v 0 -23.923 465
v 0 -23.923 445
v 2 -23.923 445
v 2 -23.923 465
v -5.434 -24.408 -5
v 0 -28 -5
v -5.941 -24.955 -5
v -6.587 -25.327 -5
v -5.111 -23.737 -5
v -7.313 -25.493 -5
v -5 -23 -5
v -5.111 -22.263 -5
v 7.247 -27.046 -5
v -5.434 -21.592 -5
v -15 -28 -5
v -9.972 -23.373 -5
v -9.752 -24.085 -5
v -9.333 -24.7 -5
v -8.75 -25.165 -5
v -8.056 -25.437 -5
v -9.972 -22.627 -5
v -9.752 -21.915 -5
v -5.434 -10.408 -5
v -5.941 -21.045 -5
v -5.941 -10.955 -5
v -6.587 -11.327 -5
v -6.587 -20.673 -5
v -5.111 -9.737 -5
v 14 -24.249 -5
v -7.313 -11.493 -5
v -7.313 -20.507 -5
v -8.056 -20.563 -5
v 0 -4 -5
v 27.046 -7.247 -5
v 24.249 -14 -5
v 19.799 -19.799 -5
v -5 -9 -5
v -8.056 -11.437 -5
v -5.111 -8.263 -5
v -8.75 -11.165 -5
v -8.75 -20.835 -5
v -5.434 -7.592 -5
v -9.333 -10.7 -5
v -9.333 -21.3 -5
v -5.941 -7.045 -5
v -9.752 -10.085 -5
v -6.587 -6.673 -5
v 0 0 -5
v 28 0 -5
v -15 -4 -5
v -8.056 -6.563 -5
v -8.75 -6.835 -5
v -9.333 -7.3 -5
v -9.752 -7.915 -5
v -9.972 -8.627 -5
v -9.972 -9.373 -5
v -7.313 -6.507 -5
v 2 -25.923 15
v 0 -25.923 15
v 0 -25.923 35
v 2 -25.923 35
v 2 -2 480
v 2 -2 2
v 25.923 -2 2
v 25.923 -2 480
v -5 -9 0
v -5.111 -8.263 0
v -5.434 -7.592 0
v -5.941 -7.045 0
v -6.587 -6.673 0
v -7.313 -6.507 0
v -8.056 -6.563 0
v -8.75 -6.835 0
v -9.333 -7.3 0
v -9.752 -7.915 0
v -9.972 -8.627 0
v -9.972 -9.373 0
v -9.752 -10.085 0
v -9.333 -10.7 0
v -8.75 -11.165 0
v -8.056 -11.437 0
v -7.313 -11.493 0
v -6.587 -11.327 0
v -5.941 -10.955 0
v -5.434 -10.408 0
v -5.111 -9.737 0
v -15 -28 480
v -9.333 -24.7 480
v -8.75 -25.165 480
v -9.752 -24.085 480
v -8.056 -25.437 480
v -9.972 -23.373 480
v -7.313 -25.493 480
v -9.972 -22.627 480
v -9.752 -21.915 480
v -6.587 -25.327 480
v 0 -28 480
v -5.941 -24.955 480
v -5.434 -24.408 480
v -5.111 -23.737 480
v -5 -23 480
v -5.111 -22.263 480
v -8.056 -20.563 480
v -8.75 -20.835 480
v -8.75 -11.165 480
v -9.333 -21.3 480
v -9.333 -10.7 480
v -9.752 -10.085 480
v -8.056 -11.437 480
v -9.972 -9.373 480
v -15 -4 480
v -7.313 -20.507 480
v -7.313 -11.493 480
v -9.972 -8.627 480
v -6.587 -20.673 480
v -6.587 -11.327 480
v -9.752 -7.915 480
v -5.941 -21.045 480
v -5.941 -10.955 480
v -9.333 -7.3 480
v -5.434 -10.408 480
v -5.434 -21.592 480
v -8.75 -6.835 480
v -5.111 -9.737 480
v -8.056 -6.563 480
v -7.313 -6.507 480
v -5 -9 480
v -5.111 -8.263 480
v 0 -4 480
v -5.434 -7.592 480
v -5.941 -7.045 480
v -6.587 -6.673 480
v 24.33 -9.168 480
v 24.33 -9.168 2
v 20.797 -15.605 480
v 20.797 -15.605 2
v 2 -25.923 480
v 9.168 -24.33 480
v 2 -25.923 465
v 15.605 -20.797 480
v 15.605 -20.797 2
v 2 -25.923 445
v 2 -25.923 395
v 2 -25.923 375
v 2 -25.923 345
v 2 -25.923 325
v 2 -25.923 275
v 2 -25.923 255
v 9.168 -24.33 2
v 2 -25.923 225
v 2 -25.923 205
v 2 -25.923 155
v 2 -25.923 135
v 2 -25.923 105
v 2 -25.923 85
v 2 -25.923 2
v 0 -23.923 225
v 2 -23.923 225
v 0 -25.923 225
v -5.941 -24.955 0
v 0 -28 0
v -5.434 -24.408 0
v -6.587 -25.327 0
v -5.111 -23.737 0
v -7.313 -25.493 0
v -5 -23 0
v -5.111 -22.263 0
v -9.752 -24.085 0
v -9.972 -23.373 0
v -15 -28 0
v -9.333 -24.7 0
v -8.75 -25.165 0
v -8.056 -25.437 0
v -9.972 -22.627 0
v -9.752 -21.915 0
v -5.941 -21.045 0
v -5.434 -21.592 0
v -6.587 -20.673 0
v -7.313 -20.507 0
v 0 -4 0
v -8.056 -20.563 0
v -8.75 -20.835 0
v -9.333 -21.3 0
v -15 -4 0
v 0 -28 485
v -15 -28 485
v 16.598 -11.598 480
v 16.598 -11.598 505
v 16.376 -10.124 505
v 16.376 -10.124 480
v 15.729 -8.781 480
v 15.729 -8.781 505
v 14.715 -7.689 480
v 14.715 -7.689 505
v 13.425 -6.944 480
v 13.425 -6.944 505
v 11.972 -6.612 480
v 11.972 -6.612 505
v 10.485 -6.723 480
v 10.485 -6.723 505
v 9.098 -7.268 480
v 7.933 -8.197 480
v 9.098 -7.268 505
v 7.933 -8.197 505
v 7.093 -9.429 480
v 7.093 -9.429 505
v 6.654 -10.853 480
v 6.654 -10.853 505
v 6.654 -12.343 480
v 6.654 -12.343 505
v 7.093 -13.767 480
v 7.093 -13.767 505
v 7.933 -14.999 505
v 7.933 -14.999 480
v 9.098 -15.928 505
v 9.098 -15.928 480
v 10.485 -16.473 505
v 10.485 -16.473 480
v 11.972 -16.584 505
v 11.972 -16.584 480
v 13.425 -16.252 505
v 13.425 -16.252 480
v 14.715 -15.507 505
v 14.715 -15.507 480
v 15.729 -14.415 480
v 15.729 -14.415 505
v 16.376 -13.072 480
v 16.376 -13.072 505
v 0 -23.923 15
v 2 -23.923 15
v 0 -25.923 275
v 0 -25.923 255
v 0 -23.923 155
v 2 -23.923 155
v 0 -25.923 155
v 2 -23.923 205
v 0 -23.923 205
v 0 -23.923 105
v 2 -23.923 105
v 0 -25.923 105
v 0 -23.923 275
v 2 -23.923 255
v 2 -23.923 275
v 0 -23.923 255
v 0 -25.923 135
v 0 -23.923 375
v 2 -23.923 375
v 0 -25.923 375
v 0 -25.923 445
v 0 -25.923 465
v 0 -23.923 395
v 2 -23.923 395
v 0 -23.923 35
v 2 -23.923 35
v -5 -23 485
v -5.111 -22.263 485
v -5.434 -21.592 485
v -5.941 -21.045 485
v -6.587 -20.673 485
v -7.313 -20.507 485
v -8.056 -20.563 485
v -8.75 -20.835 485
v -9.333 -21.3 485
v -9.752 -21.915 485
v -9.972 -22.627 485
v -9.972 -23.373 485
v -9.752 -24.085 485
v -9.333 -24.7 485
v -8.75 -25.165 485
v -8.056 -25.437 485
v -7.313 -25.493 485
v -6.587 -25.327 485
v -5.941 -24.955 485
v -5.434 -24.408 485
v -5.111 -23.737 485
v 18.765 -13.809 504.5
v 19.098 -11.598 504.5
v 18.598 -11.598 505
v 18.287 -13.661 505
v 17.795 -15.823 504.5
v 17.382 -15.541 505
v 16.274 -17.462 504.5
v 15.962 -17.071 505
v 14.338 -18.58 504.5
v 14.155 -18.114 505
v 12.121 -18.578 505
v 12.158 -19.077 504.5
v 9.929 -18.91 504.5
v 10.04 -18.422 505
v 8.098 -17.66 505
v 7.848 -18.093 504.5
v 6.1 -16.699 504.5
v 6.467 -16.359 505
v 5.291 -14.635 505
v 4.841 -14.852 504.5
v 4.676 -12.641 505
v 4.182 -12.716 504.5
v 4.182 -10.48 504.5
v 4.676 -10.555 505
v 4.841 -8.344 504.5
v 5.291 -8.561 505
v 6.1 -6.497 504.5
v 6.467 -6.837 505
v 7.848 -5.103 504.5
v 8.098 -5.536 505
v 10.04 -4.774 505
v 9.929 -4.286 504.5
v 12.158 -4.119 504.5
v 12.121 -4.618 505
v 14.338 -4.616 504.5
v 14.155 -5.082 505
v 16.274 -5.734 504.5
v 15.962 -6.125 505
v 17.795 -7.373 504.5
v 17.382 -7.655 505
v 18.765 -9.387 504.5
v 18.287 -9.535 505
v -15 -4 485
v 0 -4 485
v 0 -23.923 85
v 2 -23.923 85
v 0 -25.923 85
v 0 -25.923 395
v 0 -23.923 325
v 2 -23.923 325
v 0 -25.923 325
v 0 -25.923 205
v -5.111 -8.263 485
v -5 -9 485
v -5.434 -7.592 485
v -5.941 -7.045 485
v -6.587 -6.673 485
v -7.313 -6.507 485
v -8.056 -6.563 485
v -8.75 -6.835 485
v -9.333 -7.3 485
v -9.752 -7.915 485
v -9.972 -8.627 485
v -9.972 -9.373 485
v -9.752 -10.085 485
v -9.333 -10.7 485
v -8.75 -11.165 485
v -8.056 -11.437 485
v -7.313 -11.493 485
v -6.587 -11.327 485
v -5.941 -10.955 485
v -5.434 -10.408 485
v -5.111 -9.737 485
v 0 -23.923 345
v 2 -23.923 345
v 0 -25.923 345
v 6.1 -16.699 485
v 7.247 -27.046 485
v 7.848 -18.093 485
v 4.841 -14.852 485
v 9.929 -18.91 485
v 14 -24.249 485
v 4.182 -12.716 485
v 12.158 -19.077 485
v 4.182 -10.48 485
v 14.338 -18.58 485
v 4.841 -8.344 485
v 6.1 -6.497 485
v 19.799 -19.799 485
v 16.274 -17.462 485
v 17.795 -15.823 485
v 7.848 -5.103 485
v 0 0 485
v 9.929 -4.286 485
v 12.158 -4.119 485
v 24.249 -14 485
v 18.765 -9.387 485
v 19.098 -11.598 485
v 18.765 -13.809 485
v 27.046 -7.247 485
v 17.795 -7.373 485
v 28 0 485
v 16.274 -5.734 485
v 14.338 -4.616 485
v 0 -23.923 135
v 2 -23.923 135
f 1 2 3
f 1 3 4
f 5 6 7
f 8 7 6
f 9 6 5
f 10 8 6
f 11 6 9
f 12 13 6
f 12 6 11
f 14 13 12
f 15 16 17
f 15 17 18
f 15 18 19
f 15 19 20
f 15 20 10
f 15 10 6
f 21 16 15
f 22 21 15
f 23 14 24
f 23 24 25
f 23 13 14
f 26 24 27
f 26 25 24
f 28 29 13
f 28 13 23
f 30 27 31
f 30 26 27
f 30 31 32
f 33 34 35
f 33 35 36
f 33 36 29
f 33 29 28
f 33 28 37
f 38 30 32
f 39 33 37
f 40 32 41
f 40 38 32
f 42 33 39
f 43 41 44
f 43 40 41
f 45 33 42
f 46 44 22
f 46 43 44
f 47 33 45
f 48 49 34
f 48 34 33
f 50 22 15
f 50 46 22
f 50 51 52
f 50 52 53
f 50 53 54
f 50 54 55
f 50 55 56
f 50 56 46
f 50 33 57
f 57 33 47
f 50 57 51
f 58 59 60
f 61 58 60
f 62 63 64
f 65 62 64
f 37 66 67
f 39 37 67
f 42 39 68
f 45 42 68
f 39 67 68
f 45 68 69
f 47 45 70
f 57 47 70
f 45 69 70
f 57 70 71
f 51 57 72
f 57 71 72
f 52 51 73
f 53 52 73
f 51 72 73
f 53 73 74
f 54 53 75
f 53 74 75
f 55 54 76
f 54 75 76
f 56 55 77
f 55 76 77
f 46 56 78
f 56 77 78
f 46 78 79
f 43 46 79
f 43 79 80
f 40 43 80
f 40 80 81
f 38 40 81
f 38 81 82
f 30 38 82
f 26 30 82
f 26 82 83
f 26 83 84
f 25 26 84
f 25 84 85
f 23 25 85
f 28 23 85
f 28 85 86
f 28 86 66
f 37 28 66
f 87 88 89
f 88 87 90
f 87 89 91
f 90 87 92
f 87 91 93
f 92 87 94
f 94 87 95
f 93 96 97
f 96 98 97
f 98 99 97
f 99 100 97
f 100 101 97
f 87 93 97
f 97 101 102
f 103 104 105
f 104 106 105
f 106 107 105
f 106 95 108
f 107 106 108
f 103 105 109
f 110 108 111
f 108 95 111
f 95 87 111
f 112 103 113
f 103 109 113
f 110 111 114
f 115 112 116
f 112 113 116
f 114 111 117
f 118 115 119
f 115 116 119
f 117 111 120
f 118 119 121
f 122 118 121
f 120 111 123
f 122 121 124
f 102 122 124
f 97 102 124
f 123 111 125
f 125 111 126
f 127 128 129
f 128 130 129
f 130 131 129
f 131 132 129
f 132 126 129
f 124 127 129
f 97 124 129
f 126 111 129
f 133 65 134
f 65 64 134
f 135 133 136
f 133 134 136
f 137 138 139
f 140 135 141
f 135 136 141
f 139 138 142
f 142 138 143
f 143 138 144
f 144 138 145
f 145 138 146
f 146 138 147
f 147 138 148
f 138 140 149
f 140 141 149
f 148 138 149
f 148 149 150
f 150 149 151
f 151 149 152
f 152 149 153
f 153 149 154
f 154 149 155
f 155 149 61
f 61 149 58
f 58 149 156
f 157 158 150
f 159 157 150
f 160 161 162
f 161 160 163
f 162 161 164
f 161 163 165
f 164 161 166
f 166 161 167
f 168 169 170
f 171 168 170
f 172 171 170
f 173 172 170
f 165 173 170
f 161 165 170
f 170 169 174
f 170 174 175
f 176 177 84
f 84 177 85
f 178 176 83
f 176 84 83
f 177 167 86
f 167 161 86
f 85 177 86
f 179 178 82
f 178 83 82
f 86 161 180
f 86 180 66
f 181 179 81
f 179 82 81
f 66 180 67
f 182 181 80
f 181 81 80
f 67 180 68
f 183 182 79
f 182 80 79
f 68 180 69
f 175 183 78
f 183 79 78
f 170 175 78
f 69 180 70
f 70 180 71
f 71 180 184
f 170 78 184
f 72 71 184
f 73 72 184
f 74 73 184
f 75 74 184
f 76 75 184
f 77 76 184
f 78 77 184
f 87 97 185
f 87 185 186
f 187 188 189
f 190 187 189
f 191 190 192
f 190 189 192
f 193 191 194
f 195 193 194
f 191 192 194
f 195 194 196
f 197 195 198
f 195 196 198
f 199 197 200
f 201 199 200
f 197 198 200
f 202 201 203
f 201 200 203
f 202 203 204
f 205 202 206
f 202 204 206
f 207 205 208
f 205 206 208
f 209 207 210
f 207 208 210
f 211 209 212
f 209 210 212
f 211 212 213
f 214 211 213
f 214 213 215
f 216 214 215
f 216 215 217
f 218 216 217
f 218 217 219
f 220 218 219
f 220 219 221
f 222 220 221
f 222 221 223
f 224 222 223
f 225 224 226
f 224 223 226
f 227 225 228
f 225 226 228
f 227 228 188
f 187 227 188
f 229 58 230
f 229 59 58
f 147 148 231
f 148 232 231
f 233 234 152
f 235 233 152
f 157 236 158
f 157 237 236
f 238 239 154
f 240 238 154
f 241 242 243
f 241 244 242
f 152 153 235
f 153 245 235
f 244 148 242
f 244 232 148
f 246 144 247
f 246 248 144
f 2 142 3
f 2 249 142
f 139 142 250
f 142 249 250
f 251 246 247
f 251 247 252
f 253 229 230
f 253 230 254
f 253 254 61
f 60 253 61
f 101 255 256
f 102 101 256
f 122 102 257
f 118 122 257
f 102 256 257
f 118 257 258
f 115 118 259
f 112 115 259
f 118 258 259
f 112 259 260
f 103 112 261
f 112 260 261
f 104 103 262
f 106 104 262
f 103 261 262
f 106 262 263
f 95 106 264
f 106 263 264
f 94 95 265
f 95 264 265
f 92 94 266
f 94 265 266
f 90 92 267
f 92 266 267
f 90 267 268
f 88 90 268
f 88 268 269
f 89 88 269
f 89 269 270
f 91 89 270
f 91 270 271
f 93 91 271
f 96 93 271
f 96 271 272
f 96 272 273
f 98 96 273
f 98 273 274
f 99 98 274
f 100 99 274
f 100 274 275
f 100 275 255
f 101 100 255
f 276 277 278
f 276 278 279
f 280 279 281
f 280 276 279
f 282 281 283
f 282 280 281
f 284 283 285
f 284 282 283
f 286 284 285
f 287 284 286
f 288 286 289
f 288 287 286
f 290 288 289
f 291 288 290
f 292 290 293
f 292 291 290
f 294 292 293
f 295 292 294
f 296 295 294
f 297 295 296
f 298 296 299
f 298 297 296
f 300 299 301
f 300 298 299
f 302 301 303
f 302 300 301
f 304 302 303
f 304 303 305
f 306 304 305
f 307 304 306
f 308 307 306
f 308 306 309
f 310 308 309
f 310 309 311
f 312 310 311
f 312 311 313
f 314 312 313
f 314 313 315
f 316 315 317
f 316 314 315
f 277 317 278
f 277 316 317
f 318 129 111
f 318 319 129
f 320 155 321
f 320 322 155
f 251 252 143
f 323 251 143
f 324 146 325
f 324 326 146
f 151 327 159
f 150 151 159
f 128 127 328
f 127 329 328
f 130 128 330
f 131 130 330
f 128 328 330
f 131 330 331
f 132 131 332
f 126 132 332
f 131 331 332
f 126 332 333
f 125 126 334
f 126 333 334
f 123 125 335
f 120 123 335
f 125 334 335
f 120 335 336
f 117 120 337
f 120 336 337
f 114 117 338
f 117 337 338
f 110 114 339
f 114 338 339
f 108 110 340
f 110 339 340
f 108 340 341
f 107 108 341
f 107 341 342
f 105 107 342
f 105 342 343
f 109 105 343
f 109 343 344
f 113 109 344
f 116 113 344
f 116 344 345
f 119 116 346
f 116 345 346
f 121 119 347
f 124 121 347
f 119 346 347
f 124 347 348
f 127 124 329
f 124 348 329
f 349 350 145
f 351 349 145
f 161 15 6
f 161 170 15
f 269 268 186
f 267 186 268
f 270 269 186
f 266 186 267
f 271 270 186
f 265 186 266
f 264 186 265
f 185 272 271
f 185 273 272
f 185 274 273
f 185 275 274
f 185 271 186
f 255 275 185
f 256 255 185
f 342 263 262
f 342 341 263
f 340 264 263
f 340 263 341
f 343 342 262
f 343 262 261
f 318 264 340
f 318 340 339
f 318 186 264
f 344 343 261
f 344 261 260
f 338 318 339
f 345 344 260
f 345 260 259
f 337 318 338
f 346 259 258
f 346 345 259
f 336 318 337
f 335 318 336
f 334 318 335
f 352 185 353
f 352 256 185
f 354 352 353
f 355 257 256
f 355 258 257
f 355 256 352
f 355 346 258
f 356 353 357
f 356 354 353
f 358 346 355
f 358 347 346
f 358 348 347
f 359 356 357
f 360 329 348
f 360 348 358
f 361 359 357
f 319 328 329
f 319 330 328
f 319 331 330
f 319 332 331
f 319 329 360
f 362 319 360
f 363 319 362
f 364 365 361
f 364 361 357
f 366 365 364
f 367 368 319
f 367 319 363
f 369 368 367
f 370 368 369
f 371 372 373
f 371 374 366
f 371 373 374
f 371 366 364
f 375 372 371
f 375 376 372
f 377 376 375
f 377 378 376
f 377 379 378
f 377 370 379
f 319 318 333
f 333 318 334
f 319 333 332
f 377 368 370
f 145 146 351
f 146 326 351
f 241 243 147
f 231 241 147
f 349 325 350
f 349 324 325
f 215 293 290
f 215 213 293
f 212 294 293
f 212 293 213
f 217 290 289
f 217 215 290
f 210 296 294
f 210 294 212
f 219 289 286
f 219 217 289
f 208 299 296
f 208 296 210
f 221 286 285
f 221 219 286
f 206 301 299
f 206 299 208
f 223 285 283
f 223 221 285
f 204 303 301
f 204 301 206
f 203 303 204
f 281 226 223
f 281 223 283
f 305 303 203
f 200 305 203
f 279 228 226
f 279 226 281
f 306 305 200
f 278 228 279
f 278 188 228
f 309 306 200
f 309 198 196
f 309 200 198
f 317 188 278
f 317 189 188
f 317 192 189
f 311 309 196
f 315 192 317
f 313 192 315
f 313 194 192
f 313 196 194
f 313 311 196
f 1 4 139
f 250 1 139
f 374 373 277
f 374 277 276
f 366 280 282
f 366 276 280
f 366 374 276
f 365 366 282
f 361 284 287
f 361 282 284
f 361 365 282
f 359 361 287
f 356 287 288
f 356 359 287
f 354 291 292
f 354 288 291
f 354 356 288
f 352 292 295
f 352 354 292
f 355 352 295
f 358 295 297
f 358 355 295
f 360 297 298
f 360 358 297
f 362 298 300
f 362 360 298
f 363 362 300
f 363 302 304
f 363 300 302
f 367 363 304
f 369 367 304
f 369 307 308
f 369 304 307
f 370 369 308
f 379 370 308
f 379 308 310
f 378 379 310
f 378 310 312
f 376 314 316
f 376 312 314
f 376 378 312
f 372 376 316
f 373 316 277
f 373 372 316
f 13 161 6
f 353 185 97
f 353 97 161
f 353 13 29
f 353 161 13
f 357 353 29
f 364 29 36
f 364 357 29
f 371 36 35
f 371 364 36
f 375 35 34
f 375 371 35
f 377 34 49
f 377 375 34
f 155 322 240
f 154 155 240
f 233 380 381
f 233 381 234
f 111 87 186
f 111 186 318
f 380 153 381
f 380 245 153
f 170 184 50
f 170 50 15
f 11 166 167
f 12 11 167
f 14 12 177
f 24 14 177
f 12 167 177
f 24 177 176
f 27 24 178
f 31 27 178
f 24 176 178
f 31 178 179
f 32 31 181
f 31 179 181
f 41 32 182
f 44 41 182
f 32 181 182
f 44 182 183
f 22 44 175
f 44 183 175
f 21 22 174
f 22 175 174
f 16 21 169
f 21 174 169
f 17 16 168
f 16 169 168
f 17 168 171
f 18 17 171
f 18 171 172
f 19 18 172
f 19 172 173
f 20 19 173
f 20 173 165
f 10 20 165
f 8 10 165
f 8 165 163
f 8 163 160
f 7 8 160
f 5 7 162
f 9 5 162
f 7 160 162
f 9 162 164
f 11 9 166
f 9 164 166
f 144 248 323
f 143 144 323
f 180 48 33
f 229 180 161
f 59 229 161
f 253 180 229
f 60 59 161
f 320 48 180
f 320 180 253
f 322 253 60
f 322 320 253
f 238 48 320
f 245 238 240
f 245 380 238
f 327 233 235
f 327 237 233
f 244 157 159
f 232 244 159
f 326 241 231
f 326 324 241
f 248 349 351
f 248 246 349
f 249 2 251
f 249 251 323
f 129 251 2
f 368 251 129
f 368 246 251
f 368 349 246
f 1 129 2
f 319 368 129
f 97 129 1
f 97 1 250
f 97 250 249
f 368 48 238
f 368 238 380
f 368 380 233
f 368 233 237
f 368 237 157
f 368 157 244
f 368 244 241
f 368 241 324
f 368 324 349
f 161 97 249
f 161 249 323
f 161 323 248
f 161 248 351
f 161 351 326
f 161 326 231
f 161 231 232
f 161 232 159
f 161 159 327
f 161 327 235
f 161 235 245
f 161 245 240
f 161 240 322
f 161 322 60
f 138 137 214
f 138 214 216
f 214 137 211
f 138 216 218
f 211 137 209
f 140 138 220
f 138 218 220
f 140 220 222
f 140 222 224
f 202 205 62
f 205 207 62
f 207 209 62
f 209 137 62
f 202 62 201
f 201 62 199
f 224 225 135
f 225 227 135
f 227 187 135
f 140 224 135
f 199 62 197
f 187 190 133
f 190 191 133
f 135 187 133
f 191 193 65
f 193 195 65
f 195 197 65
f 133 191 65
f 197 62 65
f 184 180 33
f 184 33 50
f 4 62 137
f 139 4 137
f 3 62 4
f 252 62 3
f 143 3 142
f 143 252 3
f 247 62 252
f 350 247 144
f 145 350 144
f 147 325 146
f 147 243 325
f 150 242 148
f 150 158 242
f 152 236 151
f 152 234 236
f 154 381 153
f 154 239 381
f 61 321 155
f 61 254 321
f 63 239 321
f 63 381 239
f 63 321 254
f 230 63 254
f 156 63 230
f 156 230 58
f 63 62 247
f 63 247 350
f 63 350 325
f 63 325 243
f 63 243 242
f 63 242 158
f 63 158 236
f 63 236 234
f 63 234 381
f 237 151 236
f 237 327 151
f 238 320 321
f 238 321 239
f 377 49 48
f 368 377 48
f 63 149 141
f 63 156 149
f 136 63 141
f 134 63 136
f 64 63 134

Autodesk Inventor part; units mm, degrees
ref_plane "YZ Plane" through (0, 0, 0) normal (1, 0, 0) x (0, 1, 0)
ref_plane "XZ Plane" through (0, 0, 0) normal (0, 1, 0) x (-1, 0, 0)
ref_plane "XY Plane" through (0, 0, 0) normal (0, 0, 1) x (1, 0, 0)
sketch "草图1" plane through (0, 0, 0) normal (0, 0, 1) x (1, 0, 0)
  arc A0 (0, -28) -> (28, 0) centre (0, 0) ccw
  line L0 (0, 0) -> (28, 0)
  line L1 (0, 0) -> (0, -28)
  dimension "d0" = 28
extrude "拉伸1" add sketch "草图1" along normal blind 480
shell "抽壳1" thickness 2 removed faces 1 at (13.1163, -13.1163, 480)
sketch "草图2" plane through (0, 0, 480) normal (0, 0, 1) x (1, 0, 0)
  line L0 (0, -28) -> (-15, -28)
  line L1 (-15, -28) -> (-15, 0)
  line L2 (-15, 0) -> (0, 0)
  line L3 (0, 0) -> (0, -28)
  line L4 (28, 0) -> (0, 0) projected
  arc A0 (0, -28) -> (28, 0) centre (0, 0) ccw
  line L5 (0, 0) -> (28, 0)
  line L6 (0, 0) -> (0, -28)
  line L7 (0, 0) -> (0, -28) projected
  dimension "d4" = 15
extrude "拉伸2" add sketch "草图2" along normal blind 5
sketch "草图3" plane through (0, 0, 485) normal (0, 0, 1) x (1, 0, 0)
  circle A0 centre (11.598, -11.598) radius 7.5
  circle A1 centre (11.598, -11.598) radius 11.598
  line L0 (28, 0) -> (-15, 0) projected
  line L1 (0, 0) -> (0, -28) projected
  arc A2 (0, -28) -> (28, 0) centre (0, 0) ccw projected
  dimension "d7" = 15
extrude "拉伸3" add sketch "草图3" along normal blind 20 contours A0
sketch "草图4" plane through (11.598, -11.598, 505) normal (0, 0, 1) x (1, 0, 0)
  circle A0 centre (0, 0) radius 5
  circle A1 centre (0, 0) radius 7.5 projected
  point P0 (-11.598, 11.598)
  dimension "d10" = 10
extrude "拉伸4" cut sketch "草图4" against normal up to surface (25 mm away) contours A0
thread "螺纹1" size "M15x1.5" class "6g" standard "ANSI Metric M Profile" full length
chamfer "倒角1" distance 0.5 angle 45 1 edges at (4.098, -11.598, 505)
sketch "草图5" plane through (0, 0, 0) normal (0, 0, -1) x (-1, 0, 0)
  arc A0 (-28, 0) -> (0, -28) centre (0, 0) ccw
  line L0 (-28, 0) -> (15, 0)
  line L1 (-28, 0) -> (15, 0) projected
  line L2 (15, 0) -> (15, -28)
  line L3 (15, 0) -> (15, -28) projected
  line L4 (15, -28) -> (0, -28)
  line L5 (15, -28) -> (0, -28) projected
  arc A1 (-25.923, -2) -> (-2, -25.923) centre (0, 0) ccw projected
extrude "拉伸5" add sketch "草图5" along normal blind 5
sketch "草图6" plane through (0, 0, 485) normal (0, 0, 1) x (1, 0, 0)
  circle A0 centre (-7.5, -9) radius 2.5
  circle A1 centre (-7.5, -23) radius 2.5
  line L0 (28, 0) -> (-15, 0) projected
  line L1 (-15, -28) -> (0, -28) projected
  line L2 (-15, 0) -> (-15, -28) projected
  point P0 (0, 0)
  dimension "d20" = 5
  dimension "d21" = 5
  dimension "d22" = 9
  dimension "d23" = 5
  dimension "d24" = 7.5
  dimension "d25" = 7.5
extrude "拉伸6" cut sketch "草图6" against normal through all
sketch "草图7" plane through (0, 0, 485) normal (0, 0, 1) x (1, 0, 0)
  line L0 (-15, 0) -> (0, 0)
  line L1 (0, 0) -> (0, -4)
  line L2 (0, -4) -> (-15, -4)
  line L3 (-15, -4) -> (-15, 0)
  line L4 (0, 0) -> (0, -28) projected
  line L5 (28, 0) -> (-15, 0) projected
  line L6 (-15, 0) -> (-15, -28) projected
  dimension "d28" = 4
extrude "拉伸7" cut sketch "草图7" against normal through all
sketch "草图8" plane through (0, 0, -5) normal (-1, 0, 0) x (0, 0, 1)
  line L0 (7, -25.923) -> (485, -25.923) projected
  line L1 (470, -25.923) -> (450, -25.923)
  line L2 (450, -25.923) -> (450, -23.923)
  line L3 (450, -23.923) -> (470, -23.923)
  line L4 (470, -23.923) -> (470, -25.923)
  line L5 (485, -4) -> (485, -28) projected
  point P0 (5, 0)
  dimension "d31" = 20
  dimension "d32" = 2
  dimension "d33" = 15
extrude "拉伸8" cut sketch "草图8" against normal blind 2
pattern_linear "矩形阵列1" count 2 spacing 70 along (0, 0, -1) of "拉伸8"
pattern_linear "矩形阵列2" count 4 spacing 120 along (0, 0, -1) of "拉伸8", "矩形阵列1"
properties part number "分离水箱"
